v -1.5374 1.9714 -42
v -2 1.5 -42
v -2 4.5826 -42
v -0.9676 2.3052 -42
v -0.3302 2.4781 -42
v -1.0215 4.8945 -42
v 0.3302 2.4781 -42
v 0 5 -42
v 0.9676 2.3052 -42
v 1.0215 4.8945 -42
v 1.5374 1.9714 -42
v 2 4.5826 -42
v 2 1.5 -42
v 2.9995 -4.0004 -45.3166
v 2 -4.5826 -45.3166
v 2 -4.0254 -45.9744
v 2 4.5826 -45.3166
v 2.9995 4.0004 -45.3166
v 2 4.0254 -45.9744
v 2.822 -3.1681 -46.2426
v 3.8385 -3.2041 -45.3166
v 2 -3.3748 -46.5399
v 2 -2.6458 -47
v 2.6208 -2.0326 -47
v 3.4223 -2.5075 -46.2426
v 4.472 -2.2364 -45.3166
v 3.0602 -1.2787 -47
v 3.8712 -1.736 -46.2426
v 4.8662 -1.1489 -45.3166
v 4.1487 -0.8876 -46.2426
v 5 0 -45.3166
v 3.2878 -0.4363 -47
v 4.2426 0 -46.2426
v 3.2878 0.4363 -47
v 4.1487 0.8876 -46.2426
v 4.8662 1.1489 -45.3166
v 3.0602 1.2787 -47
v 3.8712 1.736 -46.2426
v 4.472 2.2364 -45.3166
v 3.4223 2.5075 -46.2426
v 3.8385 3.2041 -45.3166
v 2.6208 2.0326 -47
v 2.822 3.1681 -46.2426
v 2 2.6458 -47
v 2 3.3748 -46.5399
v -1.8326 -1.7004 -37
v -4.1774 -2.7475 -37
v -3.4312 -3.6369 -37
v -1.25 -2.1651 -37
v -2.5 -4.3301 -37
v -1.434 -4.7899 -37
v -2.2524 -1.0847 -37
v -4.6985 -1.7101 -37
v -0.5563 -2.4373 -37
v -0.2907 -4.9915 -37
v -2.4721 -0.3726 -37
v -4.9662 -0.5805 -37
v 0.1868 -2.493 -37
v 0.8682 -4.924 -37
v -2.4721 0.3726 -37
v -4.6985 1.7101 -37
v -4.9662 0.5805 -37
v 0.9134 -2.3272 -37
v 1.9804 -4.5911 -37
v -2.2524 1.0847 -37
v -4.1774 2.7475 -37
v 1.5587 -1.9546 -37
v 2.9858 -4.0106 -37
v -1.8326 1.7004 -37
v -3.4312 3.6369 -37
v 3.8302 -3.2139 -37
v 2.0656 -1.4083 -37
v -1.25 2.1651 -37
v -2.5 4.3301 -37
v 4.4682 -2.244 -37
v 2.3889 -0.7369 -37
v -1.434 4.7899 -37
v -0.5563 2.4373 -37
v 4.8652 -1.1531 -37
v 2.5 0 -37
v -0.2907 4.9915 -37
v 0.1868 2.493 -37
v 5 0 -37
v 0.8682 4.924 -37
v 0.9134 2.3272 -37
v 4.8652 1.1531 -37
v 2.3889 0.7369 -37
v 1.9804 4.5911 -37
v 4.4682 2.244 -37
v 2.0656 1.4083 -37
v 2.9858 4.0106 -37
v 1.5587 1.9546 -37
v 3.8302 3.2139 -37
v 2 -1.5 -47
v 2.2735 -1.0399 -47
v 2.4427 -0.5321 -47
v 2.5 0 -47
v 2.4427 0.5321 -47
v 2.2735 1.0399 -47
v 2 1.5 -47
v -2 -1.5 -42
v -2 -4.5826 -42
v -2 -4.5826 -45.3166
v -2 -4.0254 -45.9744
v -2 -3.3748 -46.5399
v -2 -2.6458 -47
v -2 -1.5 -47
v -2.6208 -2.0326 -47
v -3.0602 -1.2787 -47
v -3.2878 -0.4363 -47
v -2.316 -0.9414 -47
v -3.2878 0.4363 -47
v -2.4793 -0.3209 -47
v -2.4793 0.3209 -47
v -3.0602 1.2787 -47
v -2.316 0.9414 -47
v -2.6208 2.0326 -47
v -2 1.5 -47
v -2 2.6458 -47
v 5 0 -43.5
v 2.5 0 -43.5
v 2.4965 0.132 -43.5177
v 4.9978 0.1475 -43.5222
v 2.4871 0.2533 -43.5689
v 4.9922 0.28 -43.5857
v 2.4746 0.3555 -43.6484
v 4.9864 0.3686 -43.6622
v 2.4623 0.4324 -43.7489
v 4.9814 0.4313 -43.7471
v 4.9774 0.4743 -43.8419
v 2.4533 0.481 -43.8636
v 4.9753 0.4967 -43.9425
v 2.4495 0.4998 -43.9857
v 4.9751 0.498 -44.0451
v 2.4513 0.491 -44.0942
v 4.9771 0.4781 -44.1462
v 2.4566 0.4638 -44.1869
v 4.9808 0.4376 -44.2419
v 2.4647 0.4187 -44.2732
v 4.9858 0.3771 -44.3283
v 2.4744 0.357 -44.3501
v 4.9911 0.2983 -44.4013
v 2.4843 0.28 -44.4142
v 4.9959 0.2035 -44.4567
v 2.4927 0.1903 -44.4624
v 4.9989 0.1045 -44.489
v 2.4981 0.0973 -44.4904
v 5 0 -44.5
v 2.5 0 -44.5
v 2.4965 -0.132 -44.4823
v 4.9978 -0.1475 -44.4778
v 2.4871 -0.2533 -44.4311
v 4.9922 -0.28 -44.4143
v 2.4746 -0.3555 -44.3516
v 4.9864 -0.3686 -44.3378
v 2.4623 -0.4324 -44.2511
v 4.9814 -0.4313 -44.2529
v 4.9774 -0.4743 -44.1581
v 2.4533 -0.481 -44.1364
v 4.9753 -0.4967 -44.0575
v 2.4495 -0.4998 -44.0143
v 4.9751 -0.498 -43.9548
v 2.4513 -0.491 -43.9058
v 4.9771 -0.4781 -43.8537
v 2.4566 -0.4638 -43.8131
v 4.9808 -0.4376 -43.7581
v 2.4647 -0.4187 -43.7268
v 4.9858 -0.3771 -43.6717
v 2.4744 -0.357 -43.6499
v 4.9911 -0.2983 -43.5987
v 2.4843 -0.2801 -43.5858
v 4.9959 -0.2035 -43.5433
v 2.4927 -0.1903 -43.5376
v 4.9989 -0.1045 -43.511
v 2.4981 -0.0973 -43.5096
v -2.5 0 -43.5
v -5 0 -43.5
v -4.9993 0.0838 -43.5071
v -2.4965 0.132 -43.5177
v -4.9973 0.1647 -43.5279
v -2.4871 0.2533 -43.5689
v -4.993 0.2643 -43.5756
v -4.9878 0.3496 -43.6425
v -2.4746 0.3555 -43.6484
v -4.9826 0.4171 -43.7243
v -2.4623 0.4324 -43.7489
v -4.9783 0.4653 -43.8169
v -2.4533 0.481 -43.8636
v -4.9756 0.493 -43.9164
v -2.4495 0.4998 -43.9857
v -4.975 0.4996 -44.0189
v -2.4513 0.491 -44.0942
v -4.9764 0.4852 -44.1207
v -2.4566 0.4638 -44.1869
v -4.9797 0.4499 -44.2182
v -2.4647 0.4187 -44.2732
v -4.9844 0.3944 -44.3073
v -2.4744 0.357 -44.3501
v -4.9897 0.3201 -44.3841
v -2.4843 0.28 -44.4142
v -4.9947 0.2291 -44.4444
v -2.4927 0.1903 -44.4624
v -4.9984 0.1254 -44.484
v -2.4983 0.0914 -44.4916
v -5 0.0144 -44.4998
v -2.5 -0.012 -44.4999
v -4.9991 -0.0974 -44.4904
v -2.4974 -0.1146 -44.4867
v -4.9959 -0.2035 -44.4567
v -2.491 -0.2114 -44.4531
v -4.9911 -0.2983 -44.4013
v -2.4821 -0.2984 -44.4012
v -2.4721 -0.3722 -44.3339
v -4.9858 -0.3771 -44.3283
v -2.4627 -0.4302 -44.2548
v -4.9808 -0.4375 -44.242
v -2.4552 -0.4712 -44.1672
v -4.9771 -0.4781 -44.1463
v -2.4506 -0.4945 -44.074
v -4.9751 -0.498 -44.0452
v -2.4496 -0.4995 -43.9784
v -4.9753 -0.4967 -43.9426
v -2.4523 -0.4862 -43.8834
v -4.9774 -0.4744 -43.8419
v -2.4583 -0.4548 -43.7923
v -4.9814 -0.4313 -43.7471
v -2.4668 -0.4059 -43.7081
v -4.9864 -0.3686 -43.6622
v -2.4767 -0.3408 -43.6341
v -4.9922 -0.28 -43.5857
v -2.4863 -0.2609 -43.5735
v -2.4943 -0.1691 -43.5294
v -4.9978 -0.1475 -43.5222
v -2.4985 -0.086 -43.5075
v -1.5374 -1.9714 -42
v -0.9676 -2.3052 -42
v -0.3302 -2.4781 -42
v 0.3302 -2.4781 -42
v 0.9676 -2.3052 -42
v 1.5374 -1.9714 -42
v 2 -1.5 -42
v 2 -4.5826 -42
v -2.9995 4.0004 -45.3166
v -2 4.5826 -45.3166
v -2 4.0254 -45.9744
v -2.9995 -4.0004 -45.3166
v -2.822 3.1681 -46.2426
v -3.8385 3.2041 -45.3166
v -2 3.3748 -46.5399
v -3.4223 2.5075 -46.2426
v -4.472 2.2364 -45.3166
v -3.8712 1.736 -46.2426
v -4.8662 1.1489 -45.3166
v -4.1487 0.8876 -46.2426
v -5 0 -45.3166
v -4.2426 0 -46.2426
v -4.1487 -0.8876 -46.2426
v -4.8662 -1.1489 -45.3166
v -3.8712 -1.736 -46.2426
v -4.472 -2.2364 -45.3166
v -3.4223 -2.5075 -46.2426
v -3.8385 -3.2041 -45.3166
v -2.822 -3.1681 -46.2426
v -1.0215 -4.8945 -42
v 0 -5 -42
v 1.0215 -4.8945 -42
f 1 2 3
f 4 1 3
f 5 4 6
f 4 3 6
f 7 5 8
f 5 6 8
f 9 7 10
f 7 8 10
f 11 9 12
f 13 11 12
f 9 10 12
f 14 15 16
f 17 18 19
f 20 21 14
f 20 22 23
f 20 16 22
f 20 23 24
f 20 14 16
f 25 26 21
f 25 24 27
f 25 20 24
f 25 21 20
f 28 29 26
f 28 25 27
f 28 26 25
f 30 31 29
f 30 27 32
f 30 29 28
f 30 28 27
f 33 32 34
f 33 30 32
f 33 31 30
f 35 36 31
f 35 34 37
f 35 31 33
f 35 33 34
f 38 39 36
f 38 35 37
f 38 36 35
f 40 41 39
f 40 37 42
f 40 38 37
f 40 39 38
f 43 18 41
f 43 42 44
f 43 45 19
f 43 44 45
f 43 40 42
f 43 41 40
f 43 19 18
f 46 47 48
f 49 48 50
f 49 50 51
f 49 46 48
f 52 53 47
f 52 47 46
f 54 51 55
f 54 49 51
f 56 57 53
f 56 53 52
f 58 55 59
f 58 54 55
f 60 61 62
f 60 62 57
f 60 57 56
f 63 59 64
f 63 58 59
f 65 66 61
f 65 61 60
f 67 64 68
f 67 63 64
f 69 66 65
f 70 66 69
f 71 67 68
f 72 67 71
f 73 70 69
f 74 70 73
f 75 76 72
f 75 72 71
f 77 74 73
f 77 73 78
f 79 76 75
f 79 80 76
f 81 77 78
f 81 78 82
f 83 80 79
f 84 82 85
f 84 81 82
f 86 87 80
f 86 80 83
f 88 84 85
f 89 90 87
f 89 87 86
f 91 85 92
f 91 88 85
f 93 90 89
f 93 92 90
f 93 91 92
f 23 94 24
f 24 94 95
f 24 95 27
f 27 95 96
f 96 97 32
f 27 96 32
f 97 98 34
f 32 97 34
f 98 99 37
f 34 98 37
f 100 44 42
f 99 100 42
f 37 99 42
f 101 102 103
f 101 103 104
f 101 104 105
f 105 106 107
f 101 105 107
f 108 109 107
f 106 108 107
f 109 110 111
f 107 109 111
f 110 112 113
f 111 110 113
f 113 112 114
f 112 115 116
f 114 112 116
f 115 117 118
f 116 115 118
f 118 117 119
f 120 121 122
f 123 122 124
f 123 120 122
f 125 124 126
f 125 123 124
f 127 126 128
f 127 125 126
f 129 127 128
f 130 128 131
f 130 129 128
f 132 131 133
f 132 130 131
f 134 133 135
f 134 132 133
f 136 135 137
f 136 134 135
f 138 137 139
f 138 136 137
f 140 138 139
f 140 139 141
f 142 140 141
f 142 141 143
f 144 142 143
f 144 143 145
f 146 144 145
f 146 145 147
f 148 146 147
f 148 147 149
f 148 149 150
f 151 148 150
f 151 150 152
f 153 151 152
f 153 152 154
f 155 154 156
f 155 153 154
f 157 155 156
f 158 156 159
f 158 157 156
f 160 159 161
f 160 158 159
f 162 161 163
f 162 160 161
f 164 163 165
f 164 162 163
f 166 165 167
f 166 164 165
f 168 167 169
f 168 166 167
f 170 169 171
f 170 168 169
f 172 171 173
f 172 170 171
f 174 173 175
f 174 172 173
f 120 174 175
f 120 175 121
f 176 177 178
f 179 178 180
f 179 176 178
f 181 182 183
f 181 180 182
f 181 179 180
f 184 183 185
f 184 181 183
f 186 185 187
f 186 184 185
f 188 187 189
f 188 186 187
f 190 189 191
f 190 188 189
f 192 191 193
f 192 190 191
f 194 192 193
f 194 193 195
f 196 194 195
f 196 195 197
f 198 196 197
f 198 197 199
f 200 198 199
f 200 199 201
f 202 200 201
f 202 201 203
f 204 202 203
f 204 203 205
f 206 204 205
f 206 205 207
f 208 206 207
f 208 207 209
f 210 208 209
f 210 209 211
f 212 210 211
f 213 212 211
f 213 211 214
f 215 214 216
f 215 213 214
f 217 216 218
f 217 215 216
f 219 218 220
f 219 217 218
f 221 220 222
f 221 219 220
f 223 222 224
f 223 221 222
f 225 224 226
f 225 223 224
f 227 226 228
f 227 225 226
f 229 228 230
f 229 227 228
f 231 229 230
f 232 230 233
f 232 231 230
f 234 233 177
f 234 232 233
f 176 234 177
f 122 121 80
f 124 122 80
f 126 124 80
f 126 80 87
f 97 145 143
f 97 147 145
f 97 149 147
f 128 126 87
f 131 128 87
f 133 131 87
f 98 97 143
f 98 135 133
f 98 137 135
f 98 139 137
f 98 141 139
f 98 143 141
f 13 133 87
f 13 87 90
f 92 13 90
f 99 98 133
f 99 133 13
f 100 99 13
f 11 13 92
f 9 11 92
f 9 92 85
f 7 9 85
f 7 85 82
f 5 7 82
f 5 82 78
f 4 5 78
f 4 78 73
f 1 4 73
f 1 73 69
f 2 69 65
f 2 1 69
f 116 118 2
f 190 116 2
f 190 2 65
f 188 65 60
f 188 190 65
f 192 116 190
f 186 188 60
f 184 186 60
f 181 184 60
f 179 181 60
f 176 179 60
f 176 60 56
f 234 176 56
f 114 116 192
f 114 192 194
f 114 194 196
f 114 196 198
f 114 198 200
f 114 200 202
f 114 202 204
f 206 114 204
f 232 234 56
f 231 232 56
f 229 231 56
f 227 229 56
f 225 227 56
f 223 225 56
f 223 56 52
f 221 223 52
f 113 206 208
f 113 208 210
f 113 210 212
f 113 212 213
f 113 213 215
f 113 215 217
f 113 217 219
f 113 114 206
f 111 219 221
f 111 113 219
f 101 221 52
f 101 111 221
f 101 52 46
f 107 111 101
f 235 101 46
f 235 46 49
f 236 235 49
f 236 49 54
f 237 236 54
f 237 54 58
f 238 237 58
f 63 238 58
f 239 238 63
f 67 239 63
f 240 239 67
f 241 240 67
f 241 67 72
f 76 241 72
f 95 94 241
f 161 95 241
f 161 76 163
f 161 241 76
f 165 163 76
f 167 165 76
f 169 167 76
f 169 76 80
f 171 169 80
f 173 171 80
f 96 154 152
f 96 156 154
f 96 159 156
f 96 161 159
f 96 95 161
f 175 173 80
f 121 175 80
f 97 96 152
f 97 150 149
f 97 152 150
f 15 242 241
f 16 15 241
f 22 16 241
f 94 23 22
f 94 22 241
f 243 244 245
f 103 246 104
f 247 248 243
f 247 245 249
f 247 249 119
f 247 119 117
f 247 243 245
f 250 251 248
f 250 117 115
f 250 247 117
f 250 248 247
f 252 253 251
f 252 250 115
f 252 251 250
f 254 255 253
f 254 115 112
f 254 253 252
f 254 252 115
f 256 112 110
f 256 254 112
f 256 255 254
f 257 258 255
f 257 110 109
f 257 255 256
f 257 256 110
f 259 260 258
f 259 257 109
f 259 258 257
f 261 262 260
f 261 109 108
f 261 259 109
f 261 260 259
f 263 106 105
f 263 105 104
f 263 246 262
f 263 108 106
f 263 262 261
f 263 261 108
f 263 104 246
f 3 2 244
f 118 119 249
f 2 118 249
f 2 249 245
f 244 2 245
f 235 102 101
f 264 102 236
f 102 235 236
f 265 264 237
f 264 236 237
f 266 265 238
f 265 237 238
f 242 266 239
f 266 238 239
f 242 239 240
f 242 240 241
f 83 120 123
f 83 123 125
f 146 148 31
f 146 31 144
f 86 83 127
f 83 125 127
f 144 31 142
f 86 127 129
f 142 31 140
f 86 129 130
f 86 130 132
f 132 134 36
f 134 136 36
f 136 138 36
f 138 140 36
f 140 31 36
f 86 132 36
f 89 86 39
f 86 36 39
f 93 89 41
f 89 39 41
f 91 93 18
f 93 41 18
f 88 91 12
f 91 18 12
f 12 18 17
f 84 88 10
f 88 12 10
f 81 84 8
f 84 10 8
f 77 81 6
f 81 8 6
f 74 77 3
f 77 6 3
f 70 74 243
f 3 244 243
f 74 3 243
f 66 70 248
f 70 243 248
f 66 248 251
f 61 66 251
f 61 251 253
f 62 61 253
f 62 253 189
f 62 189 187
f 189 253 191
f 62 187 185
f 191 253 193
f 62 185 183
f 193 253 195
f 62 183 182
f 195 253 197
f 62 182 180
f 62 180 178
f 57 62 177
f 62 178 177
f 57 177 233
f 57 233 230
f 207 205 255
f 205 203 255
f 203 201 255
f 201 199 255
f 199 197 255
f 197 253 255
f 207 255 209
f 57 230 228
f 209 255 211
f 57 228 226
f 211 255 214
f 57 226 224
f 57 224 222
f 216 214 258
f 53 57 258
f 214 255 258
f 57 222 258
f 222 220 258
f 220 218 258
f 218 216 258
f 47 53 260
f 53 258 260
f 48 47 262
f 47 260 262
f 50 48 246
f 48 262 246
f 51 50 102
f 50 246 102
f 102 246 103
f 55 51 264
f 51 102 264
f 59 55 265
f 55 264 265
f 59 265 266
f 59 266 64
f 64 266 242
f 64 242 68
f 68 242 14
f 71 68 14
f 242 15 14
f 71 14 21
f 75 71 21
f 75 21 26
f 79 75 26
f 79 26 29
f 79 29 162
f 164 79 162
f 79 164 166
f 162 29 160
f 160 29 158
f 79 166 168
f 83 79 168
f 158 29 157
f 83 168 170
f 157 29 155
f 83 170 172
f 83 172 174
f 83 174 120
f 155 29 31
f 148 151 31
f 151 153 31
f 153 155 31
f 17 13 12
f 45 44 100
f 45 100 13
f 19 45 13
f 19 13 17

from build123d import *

# Parameters (mm, degrees)
CYLINDER037_R     = 3
CYLINDER037_DEPTH = 10
CYLINDER036_R     = 5
CYLINDER036_DEPTH = 4
CYLINDER035_R     = 0.5
CYLINDER035_DEPTH = 10
CYLINDER034_R     = 2.5
CYLINDER034_DEPTH = 10
BOX012_W          = 4
BOX012_H          = 10
BOX012_DEPTH      = 5
CYLINDER033_R     = 5
CYLINDER033_DEPTH = 10


with BuildPart() as cylinder037:
    # Cylinder037 → Cylinder037 (new body)
    with BuildSketch(Plane(origin=(18, 0, -6), x_dir=(1, 0, 0), z_dir=(0, 0, 1))):
        Circle(CYLINDER037_R)
    extrude(amount=CYLINDER037_DEPTH)


with BuildPart() as cut031:
    # Cylinder036 → Cylinder036 (new body)
    with BuildSketch(Plane(origin=(18, 0, -4), x_dir=(1, 0, 0), z_dir=(0, 0, 1))):
        Circle(CYLINDER036_R)
    extrude(amount=CYLINDER036_DEPTH)

    # Cut031: cut Cylinder037
    add(cylinder037.part, mode=Mode.SUBTRACT)


with BuildPart() as cut031_1:
    # Cut031 placement: moved
    add(cut031.part.moved(Location((-18, 0, 0))))


with BuildPart() as sphere008:
    # Sphere008 → Sphere008 (revolve)
    with BuildSketch(Plane(origin=(0, 0, -5), x_dir=(1, 0, 0), z_dir=(0, -1, 0))):
        with BuildLine():
            ThreePointArc((0, -6), (6, 0), (0, 6))
            Line((0, 6), (0, -6))
        make_face()
    revolve(axis=Axis((0, 0, -5), (0, 0, 1)))


with BuildPart() as cylinder035:
    # Cylinder035 → Cylinder035 (new body)
    with BuildSketch(Plane(origin=(5, 0, -7), x_dir=(0, 0, 1), z_dir=(-1, 0, 0))):
        Circle(CYLINDER035_R)
    extrude(amount=CYLINDER035_DEPTH)


with BuildPart() as cylinder034:
    # Cylinder034 → Cylinder034 (new body)
    with BuildSketch(Plane.XY.offset(-10)):
        Circle(CYLINDER034_R)
    extrude(amount=CYLINDER034_DEPTH)


with BuildPart() as cube012:
    # Box012 → Box012 (new body)
    with BuildSketch(Plane(origin=(-2, -5, -10), x_dir=(1, 0, 0), z_dir=(0, 0, 1))):
        with Locations((2, 5)):
            Rectangle(BOX012_W, BOX012_H)
    extrude(amount=BOX012_DEPTH)


with BuildPart() as fusion005011:
    # Cylinder033 → Cylinder033 (new body)
    with BuildSketch(Plane.XY.offset(-10)):
        Circle(CYLINDER033_R)
    extrude(amount=CYLINDER033_DEPTH)

    # Cut028: cut Cube012
    add(cube012.part, mode=Mode.SUBTRACT)

    # Cut029: cut Cylinder034
    add(cylinder034.part, mode=Mode.SUBTRACT)

    # Cut030: cut Cylinder035
    add(cylinder035.part, mode=Mode.SUBTRACT)

    # Common006: intersect Sphere008
    add(sphere008.part, mode=Mode.INTERSECT)

    # Fusion005010: union Cut031
    add(cut031_1.part)


with BuildPart() as fusion005011_1:
    # Fusion005011 placement: moved
    add(fusion005011.part.moved(Location((0, 0, -37))))


solid = fusion005011_1.part
